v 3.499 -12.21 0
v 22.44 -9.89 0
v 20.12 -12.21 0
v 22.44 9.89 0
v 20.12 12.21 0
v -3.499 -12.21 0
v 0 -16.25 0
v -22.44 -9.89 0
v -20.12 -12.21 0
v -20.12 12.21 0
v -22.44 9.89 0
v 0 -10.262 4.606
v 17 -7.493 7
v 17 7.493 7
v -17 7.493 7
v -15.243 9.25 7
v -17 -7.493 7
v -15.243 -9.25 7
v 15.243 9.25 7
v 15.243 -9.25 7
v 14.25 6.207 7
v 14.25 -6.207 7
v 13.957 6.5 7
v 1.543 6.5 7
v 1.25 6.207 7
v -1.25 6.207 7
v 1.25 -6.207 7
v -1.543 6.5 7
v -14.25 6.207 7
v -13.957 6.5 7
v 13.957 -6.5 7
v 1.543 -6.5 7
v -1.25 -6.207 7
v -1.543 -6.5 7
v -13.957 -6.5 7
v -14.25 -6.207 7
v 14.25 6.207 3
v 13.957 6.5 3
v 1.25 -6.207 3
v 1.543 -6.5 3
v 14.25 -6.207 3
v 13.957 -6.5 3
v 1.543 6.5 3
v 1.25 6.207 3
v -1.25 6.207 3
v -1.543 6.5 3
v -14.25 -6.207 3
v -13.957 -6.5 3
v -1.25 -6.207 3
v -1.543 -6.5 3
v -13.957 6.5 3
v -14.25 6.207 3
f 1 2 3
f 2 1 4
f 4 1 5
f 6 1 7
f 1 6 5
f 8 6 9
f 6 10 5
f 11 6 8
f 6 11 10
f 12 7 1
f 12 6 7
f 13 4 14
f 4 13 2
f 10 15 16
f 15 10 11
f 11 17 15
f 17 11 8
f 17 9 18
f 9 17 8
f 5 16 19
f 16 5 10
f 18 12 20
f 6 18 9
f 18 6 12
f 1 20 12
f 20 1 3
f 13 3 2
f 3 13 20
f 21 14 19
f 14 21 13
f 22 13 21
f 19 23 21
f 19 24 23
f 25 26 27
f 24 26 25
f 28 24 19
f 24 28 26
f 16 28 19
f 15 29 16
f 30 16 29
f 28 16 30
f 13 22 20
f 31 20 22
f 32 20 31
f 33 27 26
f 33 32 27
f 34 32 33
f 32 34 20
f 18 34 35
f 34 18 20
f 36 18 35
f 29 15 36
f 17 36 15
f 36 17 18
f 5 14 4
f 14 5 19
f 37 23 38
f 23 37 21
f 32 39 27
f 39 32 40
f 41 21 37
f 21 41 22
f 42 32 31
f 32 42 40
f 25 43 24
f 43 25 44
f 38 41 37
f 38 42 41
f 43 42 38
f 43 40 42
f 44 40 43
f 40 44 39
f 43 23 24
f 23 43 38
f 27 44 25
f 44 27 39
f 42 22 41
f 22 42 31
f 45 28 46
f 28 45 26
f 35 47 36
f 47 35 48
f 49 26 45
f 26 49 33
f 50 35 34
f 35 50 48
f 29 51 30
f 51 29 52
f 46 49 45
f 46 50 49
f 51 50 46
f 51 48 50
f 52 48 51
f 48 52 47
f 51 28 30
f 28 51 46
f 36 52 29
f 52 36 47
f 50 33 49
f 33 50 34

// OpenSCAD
// Cubic Dice Holder

//Size of die in mm
DieSize=12;
//Normally want to give the die some room to slide in and out easily but maybe you have a different idea
Fit=0.5; //[0:Tight,0.25:Snug,0.5:Loose]
//Mark the bottom of the well with the die size?
Tagged=0; //[0:No,1:Yes]
// Put logo of origonal author
Branded=0; //[0:No,1:Yes]
//Thickness of the wall at the top of the die holder.
WallThickness=3;
//Add an arrow to the south side as an indicator.
ArrowType=1; //[0:None,1:Style 1, 2:Style 2]
// Hard or rounded corners
CornerStyle=1;//[0:Round,1:Hard]

// Number of dice to hold
NumberOfDice = 2; //[1,2,3,4]
// How much wider it is at the bottom of the base relative to the top. (in mm)
ExtraBaseWidth = 4;

// How tall do you want it to be relative to the dice size? BaseHeight = DieSize/HeightFactor+WallThickness
HeightFactor=3;

/*
 * End of Config
 */

DieCutoutSize=DieSize+Fit;


// Dimenions of the base.
BaseEvenX = NumberOfDice >= 2 ? DieCutoutSize * 2 + WallThickness : DieCutoutSize;
BaseEvenY = NumberOfDice >= 4 ? DieCutoutSize * 2 + WallThickness : DieCutoutSize;
BaseHeight = DieSize/HeightFactor+WallThickness;
BaseOddX = DieCutoutSize;
BaseOddY = DieCutoutSize;
BaseOffsetY = NumberOfDice >= 4 ? (DieCutoutSize + WallThickness)/2 : 0;
ExtrudeScale = (BaseEvenY + ExtraBaseWidth) / BaseEvenY; // Used to get consistent results from linear extrude chamfers

function from_polar(r=1,theta=60) = [r*cos(theta),r*sin(theta)];

module star_5(radius=10,inner=0.4){
 polygon([
  from_polar(radius,0),
  from_polar(radius*inner,36),
  from_polar(radius,72),
  from_polar(radius*inner,72+36),
  from_polar(radius,72*2),
  from_polar(radius*inner,72*2+36),
  from_polar(radius,72*3),
  from_polar(radius*inner,72*3+36),
  from_polar(radius,72*4),
  from_polar(radius*inner,72*4+36)]
 );
}

module CCTag2D(Size=20, Border=true){
 BorderWidth=(Size>=20)&&Border?Size/20:0;
 ESize=Size-4*BorderWidth;
 StarSize=ESize/5;
 ChevronWidth=ESize/5;
 ChevronAngle=35;
 
 intersection(){
  union(){
   // actual tag elements:
   translate([0,-ESize/2+StarSize,0]) rotate([0,0,90]) star_5(StarSize);
   translate([-ESize/2+StarSize,ESize/2-StarSize,0]) rotate([0,0,90]) star_5(StarSize);
   translate([ESize/2-StarSize,ESize/2-StarSize,0]) rotate([0,0,90]) star_5(StarSize);
   translate([0,ChevronWidth,0]) for (i=[0,1]) mirror([i,0,0]) rotate([0,0,-ChevronAngle]) translate([0,-ChevronWidth]) square([ESize,ChevronWidth]);
  }
  square(ESize,center=true);
 }
 if (BorderWidth){
  difference(){
   square(Size,center=true);
   square(Size-BorderWidth*2,center=true);
  }
 }
}

module cutout() {
 linear_extrude(height=DieCutoutSize) 
  if (CornerStyle){
   offset(delta=Fit, chamfer=true) square(DieSize,center=true);
  } else {
   offset(r=Fit, chamfer=true) square(DieSize,center=true);
  }
  if (Tagged) translate([0,0,WallThickness]) linear_extrude(height=1, center=true) text(str(round(DieSize)), size=DieSize/16*10, halign="center", valign="center");
  if (Branded) translate([0,-DieSize/2-Fit,DieSize/HeightFactor/2+WallThickness]) rotate([90,0,0]) linear_extrude(height=0.5,center=true) CCTag2D(DieSize/HeightFactor); 
}

module base(XLength, YLength) {
 if (CornerStyle){
  offset(delta=WallThickness,chamfer=true) square([XLength, YLength],center=true);
 } else {
  offset(r=WallThickness,chamfer=true) square([XLength, YLength],center=true);
 }
}

module arrow() {
 if (ArrowType==1)
  intersection(){
   linear_extrude(height=DieCutoutSize,scale=0) 
    translate([0,-DieCutoutSize/2-WallThickness-ExtraBaseWidth,0])
     rotate([0,0,-90]) scale([1,1.5,1]) 
      circle(r=WallThickness,$fn=3); 
   cube([DieCutoutSize*2,DieCutoutSize*3,DieCutoutSize], center=true);
  } 
  if (ArrowType==2)
   translate([0,-DieCutoutSize/2-WallThickness*1.5,0]) 
    linear_extrude(height=BaseHeight, scale=ExtrudeScale)
     rotate([0,0,-90]) scale([1,1.5,1]) circle(r=WallThickness,$fn=3);
}


$fn=30;
difference(){
 union(){
  translate([0,BaseOffsetY,BaseHeight])
   rotate([180,0,180])
    linear_extrude(height=BaseHeight, scale=ExtrudeScale){
     base(BaseEvenX, BaseEvenY);
     if (NumberOfDice == 3) {
         translate([0,DieCutoutSize+WallThickness,0]) base(BaseOddX, BaseOddY);
     } 
    }
    arrow();
 }
 //Cutouts:
 CutoutOffsetX = (DieCutoutSize+WallThickness)/2; // Only used for side by side dice
 CutoutOffsetY = DieCutoutSize+ WallThickness; // Only used for dice in the seocnd row
 if (NumberOfDice <= 1) {
  translate([0,0,WallThickness]) cutout();
 } else if (NumberOfDice == 2) {
  translate([CutoutOffsetX,0,WallThickness]) cutout();
  translate([-CutoutOffsetX,0,WallThickness]) cutout();
 } else if (NumberOfDice == 3) {
  translate([CutoutOffsetX,0,WallThickness]) cutout();
  translate([-CutoutOffsetX,0,WallThickness]) cutout();
  translate([0,CutoutOffsetY,WallThickness])  cutout();
 } else if (NumberOfDice >= 4) {
  translate([CutoutOffsetX,0,WallThickness]) cutout();
  translate([-CutoutOffsetX,0,WallThickness]) cutout();
  translate([CutoutOffsetX,CutoutOffsetY,WallThickness]) cutout();
  translate([-CutoutOffsetX,CutoutOffsetY,WallThickness]) cutout();
 }
}
